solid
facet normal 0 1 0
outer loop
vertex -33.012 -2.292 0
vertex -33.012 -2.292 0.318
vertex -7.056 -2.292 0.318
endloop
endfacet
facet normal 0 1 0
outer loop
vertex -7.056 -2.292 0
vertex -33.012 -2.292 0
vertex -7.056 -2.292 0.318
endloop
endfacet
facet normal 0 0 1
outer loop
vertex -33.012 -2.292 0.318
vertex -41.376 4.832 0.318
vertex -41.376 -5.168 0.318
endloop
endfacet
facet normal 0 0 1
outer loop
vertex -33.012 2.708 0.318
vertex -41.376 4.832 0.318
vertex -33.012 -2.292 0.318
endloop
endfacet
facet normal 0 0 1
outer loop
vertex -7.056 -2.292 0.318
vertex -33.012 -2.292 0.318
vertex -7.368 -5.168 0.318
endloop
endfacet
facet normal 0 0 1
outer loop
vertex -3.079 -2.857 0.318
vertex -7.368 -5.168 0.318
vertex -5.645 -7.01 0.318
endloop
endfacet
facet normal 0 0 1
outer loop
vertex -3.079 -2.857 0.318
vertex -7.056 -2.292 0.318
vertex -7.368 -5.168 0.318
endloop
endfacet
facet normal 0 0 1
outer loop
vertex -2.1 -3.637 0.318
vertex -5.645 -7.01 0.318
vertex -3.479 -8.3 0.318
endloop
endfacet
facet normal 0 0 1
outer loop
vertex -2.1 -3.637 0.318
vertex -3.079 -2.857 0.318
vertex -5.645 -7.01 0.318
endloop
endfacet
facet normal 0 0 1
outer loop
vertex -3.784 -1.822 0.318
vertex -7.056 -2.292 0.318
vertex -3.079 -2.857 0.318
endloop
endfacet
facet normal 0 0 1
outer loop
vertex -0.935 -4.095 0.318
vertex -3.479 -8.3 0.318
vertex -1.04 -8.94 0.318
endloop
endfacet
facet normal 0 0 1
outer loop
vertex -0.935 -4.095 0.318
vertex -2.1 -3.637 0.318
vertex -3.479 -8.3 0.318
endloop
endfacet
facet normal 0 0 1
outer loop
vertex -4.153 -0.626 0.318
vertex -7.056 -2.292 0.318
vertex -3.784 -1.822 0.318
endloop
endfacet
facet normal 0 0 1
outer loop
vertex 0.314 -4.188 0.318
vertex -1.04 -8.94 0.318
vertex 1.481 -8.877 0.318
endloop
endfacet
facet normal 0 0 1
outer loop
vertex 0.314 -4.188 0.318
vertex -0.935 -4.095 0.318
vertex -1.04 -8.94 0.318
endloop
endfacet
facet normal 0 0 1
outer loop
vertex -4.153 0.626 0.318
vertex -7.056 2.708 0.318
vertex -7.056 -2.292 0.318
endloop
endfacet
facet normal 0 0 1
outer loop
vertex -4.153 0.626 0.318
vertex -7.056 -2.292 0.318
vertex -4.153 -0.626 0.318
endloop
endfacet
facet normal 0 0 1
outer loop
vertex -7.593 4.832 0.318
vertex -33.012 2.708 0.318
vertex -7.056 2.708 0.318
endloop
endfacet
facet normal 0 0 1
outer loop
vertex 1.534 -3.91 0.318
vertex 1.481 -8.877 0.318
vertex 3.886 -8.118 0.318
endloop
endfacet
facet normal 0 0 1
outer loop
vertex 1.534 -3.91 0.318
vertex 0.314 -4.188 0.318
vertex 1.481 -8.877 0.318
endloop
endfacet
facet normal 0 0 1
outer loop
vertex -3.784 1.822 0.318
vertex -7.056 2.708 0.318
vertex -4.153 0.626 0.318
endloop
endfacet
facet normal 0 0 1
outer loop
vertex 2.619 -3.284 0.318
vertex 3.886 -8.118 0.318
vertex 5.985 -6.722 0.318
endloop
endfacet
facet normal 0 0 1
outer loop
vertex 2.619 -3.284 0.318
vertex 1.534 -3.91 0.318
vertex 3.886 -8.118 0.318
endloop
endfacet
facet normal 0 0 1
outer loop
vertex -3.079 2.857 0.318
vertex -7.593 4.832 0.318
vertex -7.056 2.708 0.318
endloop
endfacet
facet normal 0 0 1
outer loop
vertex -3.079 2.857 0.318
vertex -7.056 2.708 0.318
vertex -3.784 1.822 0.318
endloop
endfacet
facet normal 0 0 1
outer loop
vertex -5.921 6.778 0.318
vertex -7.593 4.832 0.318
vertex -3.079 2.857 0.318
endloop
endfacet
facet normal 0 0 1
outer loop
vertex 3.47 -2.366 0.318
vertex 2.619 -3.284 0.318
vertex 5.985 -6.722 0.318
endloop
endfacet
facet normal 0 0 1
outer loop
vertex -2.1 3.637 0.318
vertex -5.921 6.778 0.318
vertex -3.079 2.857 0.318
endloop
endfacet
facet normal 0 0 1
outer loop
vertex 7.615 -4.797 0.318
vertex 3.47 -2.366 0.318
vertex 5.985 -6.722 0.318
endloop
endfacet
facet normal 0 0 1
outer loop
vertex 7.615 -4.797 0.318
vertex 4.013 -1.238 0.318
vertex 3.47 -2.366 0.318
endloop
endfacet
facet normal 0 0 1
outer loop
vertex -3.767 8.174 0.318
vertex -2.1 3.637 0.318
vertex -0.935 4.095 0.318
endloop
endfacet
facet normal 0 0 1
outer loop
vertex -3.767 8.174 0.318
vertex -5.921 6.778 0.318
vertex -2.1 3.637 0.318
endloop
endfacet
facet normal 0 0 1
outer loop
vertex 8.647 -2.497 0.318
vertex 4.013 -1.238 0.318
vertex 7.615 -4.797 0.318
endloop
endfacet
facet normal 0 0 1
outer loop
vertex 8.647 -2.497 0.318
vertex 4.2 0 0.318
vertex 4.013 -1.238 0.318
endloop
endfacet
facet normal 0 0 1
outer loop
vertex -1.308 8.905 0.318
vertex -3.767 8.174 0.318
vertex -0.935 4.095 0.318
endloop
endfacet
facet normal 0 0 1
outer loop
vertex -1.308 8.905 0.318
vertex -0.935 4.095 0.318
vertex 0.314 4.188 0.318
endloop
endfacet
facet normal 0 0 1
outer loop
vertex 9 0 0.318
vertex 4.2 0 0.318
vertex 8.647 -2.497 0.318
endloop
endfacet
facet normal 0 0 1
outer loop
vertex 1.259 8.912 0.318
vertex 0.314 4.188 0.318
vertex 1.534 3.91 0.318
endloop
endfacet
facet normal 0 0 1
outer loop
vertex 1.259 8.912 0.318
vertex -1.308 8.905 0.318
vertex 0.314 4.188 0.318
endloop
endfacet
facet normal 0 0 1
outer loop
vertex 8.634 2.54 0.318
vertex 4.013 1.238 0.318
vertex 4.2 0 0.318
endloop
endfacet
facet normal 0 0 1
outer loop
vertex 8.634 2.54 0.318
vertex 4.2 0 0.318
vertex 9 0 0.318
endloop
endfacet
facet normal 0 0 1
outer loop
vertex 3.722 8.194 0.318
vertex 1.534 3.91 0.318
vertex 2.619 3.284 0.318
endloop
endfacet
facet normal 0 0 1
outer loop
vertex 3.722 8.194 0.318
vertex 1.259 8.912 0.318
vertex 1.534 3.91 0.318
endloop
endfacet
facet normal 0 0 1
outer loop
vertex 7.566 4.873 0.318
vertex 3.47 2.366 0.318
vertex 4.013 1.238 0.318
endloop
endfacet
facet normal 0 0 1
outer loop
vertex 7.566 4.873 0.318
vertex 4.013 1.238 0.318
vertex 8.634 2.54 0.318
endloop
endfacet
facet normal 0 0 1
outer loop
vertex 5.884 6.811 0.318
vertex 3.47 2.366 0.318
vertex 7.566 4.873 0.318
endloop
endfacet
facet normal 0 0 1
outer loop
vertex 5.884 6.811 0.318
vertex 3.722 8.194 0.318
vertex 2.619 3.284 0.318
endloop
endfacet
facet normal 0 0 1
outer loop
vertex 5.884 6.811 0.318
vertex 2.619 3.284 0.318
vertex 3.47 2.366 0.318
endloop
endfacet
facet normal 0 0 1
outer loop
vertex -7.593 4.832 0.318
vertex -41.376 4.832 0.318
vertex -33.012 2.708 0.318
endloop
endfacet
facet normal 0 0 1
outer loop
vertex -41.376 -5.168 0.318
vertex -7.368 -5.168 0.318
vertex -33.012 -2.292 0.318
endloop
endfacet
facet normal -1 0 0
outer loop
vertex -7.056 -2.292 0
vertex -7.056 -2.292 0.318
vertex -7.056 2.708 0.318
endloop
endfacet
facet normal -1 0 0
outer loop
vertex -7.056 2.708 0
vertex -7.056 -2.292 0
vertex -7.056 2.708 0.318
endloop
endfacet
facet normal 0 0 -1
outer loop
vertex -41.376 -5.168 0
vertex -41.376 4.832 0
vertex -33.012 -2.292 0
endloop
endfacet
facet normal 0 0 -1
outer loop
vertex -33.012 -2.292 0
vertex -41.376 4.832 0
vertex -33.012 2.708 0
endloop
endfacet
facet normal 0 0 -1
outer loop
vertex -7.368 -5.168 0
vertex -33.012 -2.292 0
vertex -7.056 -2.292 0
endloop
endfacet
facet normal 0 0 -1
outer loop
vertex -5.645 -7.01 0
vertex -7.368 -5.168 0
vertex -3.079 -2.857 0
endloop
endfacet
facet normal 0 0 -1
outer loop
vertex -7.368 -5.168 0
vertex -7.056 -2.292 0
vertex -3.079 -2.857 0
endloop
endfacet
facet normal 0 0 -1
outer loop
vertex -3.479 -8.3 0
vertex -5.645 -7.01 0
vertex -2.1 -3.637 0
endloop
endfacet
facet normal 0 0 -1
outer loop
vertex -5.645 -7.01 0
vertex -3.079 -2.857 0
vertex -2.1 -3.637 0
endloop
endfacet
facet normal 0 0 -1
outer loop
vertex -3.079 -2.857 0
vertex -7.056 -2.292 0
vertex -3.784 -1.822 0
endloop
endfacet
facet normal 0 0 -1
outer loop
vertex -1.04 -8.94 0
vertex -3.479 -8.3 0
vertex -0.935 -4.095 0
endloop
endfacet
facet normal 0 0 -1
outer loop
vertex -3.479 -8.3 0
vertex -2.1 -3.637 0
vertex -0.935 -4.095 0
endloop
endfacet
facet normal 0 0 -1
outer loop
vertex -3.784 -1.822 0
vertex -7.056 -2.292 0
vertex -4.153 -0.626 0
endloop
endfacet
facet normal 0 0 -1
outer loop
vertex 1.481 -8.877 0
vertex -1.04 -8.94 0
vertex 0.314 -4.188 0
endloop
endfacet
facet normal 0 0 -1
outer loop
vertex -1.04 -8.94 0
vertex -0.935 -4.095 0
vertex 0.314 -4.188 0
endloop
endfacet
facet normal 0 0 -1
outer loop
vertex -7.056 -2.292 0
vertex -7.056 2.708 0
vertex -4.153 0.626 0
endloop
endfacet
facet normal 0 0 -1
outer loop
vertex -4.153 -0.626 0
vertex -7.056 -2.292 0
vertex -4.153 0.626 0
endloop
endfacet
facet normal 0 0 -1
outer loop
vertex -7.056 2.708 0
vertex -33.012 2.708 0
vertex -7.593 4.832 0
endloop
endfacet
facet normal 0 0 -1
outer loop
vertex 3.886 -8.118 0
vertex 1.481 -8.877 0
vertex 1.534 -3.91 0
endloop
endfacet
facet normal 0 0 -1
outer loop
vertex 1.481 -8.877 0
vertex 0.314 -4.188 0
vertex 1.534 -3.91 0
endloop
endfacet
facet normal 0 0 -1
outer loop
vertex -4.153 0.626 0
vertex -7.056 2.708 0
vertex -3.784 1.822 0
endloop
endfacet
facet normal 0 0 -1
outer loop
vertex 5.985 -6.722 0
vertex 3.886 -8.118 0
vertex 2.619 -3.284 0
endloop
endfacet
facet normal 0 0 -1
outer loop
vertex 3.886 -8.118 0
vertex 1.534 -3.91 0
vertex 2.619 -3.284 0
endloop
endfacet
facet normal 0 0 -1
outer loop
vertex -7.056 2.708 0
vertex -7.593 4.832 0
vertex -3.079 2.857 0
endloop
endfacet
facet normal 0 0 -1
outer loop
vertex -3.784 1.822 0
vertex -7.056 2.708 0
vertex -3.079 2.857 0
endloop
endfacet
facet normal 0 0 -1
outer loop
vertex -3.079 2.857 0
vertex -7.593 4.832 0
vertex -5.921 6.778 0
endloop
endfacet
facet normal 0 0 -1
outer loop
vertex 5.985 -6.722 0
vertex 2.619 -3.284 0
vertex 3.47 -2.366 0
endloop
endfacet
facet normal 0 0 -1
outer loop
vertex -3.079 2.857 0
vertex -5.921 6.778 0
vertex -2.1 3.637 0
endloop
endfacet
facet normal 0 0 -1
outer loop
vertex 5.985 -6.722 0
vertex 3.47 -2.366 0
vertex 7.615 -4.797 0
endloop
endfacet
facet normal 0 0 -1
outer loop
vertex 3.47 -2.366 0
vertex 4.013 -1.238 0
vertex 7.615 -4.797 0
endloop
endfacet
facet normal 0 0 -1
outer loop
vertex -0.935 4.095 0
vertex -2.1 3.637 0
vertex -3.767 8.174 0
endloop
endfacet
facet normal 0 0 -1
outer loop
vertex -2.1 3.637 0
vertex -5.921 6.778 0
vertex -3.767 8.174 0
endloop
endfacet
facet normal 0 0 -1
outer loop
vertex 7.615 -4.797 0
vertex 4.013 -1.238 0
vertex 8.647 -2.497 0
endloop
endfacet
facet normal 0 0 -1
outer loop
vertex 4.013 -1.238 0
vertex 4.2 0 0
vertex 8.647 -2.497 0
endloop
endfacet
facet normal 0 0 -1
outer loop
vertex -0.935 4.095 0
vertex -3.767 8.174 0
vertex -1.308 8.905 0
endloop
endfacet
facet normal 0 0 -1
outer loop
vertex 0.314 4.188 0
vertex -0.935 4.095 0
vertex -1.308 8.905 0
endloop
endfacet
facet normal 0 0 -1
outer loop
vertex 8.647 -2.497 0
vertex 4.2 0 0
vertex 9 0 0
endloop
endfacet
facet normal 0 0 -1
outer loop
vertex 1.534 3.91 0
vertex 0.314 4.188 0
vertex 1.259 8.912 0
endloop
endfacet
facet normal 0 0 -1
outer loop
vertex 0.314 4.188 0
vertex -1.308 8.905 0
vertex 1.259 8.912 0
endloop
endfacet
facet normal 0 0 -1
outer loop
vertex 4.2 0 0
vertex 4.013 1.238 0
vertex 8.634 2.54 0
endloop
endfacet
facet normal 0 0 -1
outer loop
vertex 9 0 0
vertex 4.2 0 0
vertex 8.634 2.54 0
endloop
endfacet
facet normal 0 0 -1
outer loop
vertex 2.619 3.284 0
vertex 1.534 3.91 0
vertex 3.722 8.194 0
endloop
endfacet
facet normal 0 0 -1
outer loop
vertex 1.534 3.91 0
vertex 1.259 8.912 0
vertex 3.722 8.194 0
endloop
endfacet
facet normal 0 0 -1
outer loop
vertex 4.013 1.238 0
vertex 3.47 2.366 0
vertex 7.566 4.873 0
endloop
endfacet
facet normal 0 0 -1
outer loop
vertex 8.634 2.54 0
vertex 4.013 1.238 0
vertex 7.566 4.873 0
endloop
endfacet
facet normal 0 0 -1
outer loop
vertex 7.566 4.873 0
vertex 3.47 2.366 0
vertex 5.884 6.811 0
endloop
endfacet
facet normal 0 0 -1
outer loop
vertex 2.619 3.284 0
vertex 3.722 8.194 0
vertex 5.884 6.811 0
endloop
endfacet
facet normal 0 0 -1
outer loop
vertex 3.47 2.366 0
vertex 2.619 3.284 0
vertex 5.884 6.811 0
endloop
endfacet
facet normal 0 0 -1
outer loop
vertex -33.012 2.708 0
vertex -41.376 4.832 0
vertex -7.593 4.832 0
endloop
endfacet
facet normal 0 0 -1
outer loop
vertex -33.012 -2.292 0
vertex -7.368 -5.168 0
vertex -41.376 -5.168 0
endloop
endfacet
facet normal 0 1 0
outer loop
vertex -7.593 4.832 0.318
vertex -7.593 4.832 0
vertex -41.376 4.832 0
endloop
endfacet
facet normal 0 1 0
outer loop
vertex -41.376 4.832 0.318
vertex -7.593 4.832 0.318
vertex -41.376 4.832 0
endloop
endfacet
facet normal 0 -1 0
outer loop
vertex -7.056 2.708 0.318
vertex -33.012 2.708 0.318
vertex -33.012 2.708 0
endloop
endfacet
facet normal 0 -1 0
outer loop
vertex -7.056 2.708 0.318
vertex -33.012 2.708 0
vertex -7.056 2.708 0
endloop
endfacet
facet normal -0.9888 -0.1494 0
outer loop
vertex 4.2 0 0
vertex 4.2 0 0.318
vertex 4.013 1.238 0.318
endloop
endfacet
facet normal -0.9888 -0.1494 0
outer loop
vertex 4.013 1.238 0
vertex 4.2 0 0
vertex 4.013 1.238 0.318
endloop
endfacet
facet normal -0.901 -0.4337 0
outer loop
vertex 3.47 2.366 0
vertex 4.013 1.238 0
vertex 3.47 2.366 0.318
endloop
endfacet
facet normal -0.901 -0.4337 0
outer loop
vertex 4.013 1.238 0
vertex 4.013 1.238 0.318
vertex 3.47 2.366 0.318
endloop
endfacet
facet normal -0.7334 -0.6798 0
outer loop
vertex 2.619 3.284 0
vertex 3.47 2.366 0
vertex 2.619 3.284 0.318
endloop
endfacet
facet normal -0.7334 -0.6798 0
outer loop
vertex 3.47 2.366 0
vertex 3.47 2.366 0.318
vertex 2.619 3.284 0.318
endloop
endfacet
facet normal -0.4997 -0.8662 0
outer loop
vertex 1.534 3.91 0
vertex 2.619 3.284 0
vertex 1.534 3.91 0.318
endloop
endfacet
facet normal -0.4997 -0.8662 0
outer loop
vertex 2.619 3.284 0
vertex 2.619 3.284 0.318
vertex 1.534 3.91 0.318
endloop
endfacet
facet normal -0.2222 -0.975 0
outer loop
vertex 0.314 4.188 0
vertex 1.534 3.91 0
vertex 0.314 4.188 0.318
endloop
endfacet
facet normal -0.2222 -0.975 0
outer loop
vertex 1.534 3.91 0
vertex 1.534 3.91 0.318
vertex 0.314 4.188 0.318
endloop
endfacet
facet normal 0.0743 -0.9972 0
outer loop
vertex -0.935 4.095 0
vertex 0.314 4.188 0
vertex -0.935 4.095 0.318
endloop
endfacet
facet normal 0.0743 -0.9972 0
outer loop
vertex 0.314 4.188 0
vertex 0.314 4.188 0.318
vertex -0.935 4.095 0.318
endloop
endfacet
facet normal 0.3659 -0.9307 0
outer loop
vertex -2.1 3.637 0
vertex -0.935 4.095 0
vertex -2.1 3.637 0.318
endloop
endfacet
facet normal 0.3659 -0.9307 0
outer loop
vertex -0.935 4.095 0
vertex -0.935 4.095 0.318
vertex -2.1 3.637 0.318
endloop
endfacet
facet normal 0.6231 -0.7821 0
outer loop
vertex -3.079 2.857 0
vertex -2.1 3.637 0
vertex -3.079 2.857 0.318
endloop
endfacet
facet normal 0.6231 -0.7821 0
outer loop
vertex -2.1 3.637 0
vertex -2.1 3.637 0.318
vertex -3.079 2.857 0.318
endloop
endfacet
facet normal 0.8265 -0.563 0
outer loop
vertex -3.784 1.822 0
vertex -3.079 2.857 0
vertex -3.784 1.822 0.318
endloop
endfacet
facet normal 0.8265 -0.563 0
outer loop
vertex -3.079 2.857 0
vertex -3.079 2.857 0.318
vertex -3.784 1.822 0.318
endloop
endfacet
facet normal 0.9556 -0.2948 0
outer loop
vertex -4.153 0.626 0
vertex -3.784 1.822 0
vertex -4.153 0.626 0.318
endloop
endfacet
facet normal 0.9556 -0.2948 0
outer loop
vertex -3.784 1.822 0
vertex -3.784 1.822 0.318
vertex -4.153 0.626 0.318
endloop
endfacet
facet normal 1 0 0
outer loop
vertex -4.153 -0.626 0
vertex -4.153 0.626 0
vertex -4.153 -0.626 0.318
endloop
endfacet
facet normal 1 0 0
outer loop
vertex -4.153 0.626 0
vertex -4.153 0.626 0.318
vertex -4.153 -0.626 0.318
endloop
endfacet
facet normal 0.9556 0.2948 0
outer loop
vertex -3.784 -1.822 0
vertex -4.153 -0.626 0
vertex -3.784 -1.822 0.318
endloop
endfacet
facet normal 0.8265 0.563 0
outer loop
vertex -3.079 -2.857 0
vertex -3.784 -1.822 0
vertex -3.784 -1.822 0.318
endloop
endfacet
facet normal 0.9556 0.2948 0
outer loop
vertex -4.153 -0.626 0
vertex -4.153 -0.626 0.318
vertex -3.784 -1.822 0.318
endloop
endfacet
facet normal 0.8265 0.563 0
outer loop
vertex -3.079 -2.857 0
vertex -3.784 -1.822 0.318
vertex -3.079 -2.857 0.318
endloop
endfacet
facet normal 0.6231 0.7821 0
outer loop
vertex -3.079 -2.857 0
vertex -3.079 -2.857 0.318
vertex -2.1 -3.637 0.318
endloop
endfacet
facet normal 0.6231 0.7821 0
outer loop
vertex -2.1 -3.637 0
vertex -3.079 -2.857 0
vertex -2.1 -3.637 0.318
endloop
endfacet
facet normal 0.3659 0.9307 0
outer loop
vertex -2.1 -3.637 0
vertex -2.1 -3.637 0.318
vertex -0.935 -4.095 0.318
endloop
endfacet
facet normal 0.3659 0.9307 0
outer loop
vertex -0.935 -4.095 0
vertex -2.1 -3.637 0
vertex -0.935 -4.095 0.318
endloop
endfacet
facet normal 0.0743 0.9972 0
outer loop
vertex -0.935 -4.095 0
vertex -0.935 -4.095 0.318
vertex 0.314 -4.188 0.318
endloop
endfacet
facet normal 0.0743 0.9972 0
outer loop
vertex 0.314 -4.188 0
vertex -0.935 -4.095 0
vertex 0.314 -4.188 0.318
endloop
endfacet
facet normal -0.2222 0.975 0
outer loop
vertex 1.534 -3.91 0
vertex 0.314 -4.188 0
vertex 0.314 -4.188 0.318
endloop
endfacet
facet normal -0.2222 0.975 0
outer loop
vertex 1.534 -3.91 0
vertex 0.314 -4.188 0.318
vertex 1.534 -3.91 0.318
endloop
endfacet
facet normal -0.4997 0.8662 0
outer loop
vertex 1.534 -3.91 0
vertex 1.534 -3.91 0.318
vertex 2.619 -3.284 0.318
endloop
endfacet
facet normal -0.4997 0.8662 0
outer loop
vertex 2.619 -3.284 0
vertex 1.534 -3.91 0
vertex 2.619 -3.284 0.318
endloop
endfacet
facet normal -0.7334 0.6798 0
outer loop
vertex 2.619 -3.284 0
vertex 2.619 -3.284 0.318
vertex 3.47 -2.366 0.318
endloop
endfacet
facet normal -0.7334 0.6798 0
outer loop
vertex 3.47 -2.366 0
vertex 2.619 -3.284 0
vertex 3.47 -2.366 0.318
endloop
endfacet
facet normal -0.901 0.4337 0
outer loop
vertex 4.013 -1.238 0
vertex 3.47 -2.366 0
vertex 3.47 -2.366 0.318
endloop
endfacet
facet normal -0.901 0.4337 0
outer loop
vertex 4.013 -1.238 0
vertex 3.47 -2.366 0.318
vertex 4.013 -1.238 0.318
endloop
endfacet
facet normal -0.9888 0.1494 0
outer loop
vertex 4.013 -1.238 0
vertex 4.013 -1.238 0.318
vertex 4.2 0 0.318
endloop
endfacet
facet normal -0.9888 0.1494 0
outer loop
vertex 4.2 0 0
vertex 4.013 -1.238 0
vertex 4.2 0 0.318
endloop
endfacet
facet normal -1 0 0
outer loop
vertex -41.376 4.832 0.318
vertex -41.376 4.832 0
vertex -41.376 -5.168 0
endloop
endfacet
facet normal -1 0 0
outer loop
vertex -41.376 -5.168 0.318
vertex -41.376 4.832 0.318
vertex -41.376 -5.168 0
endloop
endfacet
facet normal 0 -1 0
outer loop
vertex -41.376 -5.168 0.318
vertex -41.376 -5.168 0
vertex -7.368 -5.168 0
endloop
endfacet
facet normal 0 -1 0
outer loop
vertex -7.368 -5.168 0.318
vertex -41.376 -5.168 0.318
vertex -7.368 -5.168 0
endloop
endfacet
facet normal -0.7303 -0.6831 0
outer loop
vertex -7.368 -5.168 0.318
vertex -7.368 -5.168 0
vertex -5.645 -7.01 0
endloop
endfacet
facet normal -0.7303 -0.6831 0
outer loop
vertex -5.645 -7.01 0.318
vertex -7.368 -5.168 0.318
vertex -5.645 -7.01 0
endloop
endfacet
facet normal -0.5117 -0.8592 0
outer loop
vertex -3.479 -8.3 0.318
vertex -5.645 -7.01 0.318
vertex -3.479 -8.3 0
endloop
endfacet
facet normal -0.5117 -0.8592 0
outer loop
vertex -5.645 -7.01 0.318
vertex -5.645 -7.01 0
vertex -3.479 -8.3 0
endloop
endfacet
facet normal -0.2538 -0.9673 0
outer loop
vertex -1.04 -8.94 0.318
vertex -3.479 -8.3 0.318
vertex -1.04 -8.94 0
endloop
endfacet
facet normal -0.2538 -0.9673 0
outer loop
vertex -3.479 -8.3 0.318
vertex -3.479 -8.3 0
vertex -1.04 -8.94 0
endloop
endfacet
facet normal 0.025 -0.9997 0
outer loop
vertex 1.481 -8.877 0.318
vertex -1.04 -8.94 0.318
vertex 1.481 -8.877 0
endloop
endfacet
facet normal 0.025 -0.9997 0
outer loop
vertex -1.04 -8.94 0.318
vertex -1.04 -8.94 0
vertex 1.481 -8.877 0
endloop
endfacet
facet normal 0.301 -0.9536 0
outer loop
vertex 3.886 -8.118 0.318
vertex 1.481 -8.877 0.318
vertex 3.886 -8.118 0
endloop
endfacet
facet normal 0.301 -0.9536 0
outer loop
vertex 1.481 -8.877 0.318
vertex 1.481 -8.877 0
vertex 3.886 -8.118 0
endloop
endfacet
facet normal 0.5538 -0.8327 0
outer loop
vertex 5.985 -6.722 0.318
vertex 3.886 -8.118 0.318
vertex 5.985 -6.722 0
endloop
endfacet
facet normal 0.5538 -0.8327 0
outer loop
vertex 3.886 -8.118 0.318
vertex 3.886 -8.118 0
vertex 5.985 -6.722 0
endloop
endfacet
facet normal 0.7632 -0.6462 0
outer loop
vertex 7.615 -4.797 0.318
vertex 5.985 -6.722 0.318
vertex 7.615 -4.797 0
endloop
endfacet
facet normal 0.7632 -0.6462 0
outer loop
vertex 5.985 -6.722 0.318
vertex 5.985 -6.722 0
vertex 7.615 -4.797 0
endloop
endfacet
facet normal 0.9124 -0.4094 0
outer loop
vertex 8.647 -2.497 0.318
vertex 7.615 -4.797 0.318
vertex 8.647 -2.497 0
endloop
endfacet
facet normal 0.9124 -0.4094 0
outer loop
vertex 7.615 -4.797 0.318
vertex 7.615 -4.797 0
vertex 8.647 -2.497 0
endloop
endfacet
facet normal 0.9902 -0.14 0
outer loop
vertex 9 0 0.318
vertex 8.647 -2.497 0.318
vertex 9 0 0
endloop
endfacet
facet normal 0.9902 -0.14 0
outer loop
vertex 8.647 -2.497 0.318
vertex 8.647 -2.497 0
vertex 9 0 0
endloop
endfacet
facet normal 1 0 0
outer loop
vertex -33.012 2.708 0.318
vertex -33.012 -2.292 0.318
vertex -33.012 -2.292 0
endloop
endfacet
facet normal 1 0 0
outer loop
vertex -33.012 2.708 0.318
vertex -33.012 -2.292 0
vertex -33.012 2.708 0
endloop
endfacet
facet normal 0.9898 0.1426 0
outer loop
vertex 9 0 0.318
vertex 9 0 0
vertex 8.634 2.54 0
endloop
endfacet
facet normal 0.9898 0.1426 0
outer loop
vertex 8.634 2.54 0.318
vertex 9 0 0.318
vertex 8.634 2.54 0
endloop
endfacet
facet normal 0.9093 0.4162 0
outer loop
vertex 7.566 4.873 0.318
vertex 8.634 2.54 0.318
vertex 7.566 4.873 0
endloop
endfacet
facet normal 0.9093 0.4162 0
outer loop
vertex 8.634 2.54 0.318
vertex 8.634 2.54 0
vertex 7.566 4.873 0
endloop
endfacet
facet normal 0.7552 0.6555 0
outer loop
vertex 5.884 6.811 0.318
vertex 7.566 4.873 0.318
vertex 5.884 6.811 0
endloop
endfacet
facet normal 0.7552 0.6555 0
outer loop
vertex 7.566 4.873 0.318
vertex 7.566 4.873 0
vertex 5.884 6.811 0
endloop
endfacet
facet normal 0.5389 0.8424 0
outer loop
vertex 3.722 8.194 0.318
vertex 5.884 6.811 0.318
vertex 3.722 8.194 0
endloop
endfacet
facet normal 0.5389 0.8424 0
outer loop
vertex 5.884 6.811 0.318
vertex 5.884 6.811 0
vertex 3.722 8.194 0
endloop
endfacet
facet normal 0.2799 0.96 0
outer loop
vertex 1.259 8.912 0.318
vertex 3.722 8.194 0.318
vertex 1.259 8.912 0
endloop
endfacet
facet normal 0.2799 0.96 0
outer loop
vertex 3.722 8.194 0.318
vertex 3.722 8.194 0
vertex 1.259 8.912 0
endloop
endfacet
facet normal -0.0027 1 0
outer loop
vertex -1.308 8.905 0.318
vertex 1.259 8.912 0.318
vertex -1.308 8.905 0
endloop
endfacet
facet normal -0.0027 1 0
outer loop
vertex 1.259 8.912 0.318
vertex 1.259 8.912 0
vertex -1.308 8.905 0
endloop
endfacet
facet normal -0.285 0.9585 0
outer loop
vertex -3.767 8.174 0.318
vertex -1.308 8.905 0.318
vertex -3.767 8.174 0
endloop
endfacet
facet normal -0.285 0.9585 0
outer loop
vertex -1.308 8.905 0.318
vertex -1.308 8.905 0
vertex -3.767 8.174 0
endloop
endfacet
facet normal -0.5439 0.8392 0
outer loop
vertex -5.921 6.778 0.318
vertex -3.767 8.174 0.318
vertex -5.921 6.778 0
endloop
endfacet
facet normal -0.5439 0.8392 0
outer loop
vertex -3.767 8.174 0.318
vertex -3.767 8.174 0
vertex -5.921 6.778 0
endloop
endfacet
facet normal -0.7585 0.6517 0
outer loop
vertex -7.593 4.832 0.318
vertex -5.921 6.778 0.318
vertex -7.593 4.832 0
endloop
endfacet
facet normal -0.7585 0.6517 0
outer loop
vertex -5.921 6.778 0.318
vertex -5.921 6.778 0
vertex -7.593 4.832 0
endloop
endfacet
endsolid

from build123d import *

# Parameters (mm, degrees)
BOSS_EXTRUDE2_DEPTH = 0.3175
SKETCH3_R           = 4.2
SKETCH3_W           = 25.956624075
SKETCH3_H           = 5
CUT_EXTRUDE1_DEPTH  = 1.3175


with BuildPart() as part:
    # Sketch2 → Boss-Extrude2 (new body)
    with BuildSketch(Plane.XY):
        with BuildLine():
            Line((-6.375715531, -5.168393782), (-6.375715531, 4.831606218))
            Line((-6.375715531, 4.831606218), (-7.593127245, 4.831606218))
            ThreePointArc((-7.593127245, 4.831606218), (-8.997720551, -0.202546003), (-7.368019117, -5.168393782))
            Line((-7.368019117, -5.168393782), (-6.375715531, -5.168393782))
        make_face()
        with BuildLine():
            Line((-7.593127245, 4.831606218), (-6.375715531, 4.831606218))
            Line((-6.375715531, 4.831606218), (-6.375715531, -5.168393782))
            Line((-6.375715531, -5.168393782), (-7.368019117, -5.168393782))
            ThreePointArc((-7.368019117, -5.168393782), (2.709965677, -8.582312394), (9, 0))
            ThreePointArc((9, 0), (2.516133422, 8.641126813), (-7.593127245, 4.831606218))
        make_face()
        with BuildLine():
            ThreePointArc((-7.368019117, -5.168393782), (-8.997720551, -0.202546003), (-7.593127245, 4.831606218))
            Line((-7.593127245, 4.831606218), (-41.375715531, 4.831606218))
            Line((-41.375715531, 4.831606218), (-41.375715531, -5.168393782))
            Line((-41.375715531, -5.168393782), (-7.368019117, -5.168393782))
        make_face()
    extrude(amount=BOSS_EXTRUDE2_DEPTH)

    # Sketch3 → Cut-Extrude1 (cut, through all)
    with BuildSketch(Plane.XY.offset(0.3175)):
        Circle(SKETCH3_R)
        with Locations((-20.034010662, 0.207958654)):
            Rectangle(SKETCH3_W, SKETCH3_H)
    extrude(amount=-CUT_EXTRUDE1_DEPTH, mode=Mode.SUBTRACT)


solid = part.part
